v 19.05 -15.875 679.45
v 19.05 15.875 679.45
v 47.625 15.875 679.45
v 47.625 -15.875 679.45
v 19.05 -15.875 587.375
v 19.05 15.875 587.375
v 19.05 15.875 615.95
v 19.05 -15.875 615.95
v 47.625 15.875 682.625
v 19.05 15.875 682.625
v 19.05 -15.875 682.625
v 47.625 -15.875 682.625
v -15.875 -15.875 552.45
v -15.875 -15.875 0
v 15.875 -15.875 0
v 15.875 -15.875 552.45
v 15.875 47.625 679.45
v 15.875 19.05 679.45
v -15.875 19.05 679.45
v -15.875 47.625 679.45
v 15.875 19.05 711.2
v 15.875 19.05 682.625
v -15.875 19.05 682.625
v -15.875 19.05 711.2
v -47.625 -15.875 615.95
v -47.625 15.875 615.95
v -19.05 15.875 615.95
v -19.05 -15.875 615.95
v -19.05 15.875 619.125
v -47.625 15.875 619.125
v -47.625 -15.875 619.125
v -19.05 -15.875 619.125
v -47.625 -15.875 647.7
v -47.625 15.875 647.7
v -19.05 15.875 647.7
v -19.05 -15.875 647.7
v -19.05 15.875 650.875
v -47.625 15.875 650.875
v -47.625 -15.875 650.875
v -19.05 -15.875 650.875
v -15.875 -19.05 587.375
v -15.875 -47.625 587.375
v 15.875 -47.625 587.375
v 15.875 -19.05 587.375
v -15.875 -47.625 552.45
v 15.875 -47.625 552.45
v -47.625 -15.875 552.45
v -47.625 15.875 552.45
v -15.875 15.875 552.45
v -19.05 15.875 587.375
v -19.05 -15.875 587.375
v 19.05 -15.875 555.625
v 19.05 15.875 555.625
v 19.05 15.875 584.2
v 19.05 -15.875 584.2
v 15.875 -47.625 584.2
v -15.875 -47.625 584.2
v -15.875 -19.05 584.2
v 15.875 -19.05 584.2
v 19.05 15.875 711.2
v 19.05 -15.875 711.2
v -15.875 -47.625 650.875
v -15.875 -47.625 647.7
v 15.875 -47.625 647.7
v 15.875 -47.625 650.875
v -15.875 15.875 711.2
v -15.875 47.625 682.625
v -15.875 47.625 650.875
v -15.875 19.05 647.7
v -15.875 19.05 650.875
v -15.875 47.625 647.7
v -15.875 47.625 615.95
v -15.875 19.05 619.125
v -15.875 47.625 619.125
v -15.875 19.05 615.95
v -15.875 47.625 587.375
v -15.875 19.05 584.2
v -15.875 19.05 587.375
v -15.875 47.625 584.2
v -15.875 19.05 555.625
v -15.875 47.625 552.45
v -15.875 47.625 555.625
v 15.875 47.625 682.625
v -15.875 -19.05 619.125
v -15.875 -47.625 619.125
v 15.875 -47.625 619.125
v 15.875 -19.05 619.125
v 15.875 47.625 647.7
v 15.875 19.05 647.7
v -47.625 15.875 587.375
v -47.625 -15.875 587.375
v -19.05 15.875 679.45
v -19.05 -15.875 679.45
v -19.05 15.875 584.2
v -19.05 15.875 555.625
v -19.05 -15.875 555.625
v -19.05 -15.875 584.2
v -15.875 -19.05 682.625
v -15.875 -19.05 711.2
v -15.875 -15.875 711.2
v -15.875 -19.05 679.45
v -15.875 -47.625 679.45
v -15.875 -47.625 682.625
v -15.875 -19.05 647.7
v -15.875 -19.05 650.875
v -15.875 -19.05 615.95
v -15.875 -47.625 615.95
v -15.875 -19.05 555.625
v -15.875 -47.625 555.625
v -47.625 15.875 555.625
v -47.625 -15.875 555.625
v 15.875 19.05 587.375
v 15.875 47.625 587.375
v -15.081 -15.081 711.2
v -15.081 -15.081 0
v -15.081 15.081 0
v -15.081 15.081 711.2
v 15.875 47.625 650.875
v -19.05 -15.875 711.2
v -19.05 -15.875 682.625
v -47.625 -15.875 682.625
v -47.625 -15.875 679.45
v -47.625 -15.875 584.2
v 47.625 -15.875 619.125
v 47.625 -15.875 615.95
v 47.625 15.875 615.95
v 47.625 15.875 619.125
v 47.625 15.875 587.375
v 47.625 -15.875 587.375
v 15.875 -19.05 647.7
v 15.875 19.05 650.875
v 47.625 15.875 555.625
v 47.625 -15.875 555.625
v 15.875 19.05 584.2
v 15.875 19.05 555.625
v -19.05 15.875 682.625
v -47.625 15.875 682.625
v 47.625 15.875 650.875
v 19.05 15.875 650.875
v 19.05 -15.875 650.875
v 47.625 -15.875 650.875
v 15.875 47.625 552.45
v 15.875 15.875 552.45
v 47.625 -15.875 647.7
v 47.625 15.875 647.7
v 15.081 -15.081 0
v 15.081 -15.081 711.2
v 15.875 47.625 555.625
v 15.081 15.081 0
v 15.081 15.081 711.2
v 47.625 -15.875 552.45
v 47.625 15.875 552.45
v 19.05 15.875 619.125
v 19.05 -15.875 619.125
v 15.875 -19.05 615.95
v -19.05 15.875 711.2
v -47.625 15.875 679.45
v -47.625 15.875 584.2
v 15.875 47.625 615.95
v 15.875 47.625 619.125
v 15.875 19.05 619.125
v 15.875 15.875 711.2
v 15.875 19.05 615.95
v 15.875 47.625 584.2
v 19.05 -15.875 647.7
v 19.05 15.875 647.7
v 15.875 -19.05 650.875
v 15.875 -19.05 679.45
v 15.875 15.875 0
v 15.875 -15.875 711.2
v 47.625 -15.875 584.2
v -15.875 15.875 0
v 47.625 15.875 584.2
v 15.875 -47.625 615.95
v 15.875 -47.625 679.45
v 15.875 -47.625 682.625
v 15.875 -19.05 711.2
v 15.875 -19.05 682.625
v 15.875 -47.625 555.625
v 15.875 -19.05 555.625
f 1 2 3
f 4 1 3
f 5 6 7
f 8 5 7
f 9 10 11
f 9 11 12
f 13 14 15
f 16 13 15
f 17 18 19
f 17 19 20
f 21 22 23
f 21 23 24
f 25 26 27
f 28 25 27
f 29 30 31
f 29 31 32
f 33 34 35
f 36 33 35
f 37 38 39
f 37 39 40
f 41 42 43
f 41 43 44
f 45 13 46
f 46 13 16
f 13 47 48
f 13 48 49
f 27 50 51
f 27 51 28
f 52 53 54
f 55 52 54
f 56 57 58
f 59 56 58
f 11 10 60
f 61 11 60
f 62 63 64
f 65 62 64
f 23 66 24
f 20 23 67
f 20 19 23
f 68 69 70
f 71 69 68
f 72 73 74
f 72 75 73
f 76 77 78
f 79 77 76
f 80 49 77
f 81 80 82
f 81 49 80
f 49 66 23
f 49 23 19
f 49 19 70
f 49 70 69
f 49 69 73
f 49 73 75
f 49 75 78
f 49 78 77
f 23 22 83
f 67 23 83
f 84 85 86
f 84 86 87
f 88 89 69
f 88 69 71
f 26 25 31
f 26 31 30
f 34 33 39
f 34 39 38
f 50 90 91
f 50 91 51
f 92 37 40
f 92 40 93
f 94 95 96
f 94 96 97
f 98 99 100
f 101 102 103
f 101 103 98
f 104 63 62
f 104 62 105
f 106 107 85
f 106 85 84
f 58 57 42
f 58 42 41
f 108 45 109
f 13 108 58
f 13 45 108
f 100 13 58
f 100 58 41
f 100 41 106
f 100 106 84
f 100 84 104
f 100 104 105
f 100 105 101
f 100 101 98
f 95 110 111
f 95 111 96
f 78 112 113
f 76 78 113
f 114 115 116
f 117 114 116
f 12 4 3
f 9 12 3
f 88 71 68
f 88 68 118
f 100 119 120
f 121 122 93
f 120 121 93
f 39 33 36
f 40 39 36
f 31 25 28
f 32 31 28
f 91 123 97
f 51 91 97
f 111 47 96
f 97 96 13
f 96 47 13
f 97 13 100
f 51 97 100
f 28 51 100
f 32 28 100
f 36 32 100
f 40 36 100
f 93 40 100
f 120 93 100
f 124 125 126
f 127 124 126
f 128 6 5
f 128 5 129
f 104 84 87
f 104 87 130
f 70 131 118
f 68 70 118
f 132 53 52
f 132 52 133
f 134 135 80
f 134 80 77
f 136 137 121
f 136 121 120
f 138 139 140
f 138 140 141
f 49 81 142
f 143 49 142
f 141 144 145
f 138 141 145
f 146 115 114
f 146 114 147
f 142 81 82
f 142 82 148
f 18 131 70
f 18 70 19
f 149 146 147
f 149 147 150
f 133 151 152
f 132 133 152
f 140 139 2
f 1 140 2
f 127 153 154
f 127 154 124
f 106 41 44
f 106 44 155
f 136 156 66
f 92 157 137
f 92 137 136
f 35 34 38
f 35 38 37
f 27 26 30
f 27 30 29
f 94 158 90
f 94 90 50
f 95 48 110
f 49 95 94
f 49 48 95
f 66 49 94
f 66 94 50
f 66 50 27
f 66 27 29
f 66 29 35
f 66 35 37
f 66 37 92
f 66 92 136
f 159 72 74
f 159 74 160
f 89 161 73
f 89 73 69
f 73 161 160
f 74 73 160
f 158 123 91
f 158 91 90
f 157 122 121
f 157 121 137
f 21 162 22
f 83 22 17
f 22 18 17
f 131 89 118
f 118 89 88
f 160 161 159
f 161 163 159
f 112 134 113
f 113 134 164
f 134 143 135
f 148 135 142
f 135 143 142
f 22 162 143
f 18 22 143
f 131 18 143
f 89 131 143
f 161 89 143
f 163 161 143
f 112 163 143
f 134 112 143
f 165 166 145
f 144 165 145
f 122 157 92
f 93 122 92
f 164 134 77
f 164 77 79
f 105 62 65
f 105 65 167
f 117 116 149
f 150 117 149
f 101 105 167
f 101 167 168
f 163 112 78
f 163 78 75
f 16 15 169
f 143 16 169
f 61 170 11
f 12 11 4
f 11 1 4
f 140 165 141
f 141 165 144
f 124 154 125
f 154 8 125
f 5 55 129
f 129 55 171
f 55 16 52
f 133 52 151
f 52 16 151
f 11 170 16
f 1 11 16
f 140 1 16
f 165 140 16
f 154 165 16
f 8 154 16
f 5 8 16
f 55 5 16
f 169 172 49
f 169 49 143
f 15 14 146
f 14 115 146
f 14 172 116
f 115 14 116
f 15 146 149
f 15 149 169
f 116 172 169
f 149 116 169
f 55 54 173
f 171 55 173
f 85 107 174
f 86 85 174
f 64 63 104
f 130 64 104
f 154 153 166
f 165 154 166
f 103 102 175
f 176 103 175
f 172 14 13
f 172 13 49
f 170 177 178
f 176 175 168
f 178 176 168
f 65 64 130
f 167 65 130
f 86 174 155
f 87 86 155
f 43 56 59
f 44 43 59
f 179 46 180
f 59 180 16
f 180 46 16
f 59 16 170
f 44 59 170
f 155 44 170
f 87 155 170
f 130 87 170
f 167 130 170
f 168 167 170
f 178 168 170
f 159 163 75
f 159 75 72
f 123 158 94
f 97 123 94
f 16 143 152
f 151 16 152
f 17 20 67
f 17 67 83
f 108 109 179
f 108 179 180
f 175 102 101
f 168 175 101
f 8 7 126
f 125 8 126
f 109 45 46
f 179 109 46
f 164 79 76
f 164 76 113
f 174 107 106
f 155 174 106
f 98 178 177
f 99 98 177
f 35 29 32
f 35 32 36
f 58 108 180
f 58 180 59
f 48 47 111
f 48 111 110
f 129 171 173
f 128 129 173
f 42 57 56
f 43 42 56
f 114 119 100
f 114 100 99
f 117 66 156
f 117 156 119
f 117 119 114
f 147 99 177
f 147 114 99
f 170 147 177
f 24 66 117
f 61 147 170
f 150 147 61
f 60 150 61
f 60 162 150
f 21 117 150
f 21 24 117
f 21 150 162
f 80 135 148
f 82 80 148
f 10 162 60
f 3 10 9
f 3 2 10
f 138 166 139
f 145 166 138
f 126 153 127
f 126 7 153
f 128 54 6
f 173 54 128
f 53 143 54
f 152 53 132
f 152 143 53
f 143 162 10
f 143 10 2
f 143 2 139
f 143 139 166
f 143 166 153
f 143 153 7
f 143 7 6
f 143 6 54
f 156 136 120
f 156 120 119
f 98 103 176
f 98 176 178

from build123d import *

# Parameters (mm, degrees)
F0_W          = 31.75
F0_H          = 31.75
F0_W_2        = 30.1625
F0_H_2        = 30.1625
F1_DEPTH      = 711.2
F5_START      = 552.45
F4_W          = 31.75
F4_H          = 31.75
F5_DEPTH      = 158.75
F6_W          = 28.575
F6_H          = 28.575
F7_DEPTH      = 25.4
F7_DEPTH_BACK = 25.4
F8_W          = 28.575
F8_H          = 28.575
F9_DEPTH      = 25.4
F9_DEPTH_BACK = 25.4
F11_START     = 552.45
F10_W         = 30.1625
F10_H         = 30.1625
F11_DEPTH     = 158.75


with BuildPart() as f1:
    # F0 (on Top) → F1 (new body)
    with BuildSketch(Plane.XY):
        Rectangle(F0_W, F0_H)
        Rectangle(F0_W_2, F0_H_2, mode=Mode.SUBTRACT)
    extrude(amount=F1_DEPTH)

    # F4 (on Top) → F5 (join)
    with BuildSketch(Plane.XY.offset(F5_START)):
        with Locations((31.75, 0)):
            Rectangle(F4_W, F4_H)
        with Locations((-31.75, 0)):
            Rectangle(F4_W, F4_H)
        with Locations((0, 31.75)):
            Rectangle(F4_W, F4_H)
        with Locations((0, -31.75)):
            Rectangle(F4_W, F4_H)
    extrude(amount=F5_DEPTH)

    # F6 (on Front) → F7 (cut, two sides)
    with BuildSketch(Plane.XZ) as f7_sk:
        with Locations((33.3375, 665.1625)):
            Rectangle(F6_W, F6_H)
        with Locations((33.3375, 696.9125)):
            Rectangle(F6_W, F6_H)
        with Locations((-33.3375, 696.9125)):
            Rectangle(F6_W, F6_H)
        with Locations((-33.3375, 665.1625)):
            Rectangle(F6_W, F6_H)
        with Locations((33.3375, 633.4125)):
            Rectangle(F6_W, F6_H)
        with Locations((33.3375, 601.6625)):
            Rectangle(F6_W, F6_H)
        with Locations((33.3375, 569.9125)):
            Rectangle(F6_W, F6_H)
        with Locations((-33.3375, 633.4125)):
            Rectangle(F6_W, F6_H)
        with Locations((-33.3375, 601.6625)):
            Rectangle(F6_W, F6_H)
        with Locations((-33.3375, 569.9125)):
            Rectangle(F6_W, F6_H)
    extrude(amount=-F7_DEPTH, mode=Mode.SUBTRACT)
    extrude(f7_sk.sketch, amount=F7_DEPTH_BACK, mode=Mode.SUBTRACT)

    # F8 (on Right) → F9 (cut, two sides)
    with BuildSketch(Plane.YZ) as f9_sk:
        with Locations((33.3375, 696.9125)):
            Rectangle(F8_W, F8_H)
        with Locations((33.3375, 665.1625)):
            Rectangle(F8_W, F8_H)
        with Locations((-33.3375, 696.9125)):
            Rectangle(F8_W, F8_H)
        with Locations((-33.3375, 665.1625)):
            Rectangle(F8_W, F8_H)
        with Locations((33.3375, 633.4125)):
            Rectangle(F8_W, F8_H)
        with Locations((33.3375, 601.6625)):
            Rectangle(F8_W, F8_H)
        with Locations((33.3375, 569.9125)):
            Rectangle(F8_W, F8_H)
        with Locations((-33.3375, 633.4125)):
            Rectangle(F8_W, F8_H)
        with Locations((-33.3375, 601.6625)):
            Rectangle(F8_W, F8_H)
        with Locations((-33.3375, 569.9125)):
            Rectangle(F8_W, F8_H)
    extrude(amount=-F9_DEPTH, mode=Mode.SUBTRACT)
    extrude(f9_sk.sketch, amount=F9_DEPTH_BACK, mode=Mode.SUBTRACT)


with BuildPart() as f11:
    # F10 (on Top) → F11 (new body)
    with BuildSketch(Plane.XY.offset(F11_START)):
        Rectangle(F10_W, F10_H)
    extrude(amount=F11_DEPTH)


solid = f1.part
